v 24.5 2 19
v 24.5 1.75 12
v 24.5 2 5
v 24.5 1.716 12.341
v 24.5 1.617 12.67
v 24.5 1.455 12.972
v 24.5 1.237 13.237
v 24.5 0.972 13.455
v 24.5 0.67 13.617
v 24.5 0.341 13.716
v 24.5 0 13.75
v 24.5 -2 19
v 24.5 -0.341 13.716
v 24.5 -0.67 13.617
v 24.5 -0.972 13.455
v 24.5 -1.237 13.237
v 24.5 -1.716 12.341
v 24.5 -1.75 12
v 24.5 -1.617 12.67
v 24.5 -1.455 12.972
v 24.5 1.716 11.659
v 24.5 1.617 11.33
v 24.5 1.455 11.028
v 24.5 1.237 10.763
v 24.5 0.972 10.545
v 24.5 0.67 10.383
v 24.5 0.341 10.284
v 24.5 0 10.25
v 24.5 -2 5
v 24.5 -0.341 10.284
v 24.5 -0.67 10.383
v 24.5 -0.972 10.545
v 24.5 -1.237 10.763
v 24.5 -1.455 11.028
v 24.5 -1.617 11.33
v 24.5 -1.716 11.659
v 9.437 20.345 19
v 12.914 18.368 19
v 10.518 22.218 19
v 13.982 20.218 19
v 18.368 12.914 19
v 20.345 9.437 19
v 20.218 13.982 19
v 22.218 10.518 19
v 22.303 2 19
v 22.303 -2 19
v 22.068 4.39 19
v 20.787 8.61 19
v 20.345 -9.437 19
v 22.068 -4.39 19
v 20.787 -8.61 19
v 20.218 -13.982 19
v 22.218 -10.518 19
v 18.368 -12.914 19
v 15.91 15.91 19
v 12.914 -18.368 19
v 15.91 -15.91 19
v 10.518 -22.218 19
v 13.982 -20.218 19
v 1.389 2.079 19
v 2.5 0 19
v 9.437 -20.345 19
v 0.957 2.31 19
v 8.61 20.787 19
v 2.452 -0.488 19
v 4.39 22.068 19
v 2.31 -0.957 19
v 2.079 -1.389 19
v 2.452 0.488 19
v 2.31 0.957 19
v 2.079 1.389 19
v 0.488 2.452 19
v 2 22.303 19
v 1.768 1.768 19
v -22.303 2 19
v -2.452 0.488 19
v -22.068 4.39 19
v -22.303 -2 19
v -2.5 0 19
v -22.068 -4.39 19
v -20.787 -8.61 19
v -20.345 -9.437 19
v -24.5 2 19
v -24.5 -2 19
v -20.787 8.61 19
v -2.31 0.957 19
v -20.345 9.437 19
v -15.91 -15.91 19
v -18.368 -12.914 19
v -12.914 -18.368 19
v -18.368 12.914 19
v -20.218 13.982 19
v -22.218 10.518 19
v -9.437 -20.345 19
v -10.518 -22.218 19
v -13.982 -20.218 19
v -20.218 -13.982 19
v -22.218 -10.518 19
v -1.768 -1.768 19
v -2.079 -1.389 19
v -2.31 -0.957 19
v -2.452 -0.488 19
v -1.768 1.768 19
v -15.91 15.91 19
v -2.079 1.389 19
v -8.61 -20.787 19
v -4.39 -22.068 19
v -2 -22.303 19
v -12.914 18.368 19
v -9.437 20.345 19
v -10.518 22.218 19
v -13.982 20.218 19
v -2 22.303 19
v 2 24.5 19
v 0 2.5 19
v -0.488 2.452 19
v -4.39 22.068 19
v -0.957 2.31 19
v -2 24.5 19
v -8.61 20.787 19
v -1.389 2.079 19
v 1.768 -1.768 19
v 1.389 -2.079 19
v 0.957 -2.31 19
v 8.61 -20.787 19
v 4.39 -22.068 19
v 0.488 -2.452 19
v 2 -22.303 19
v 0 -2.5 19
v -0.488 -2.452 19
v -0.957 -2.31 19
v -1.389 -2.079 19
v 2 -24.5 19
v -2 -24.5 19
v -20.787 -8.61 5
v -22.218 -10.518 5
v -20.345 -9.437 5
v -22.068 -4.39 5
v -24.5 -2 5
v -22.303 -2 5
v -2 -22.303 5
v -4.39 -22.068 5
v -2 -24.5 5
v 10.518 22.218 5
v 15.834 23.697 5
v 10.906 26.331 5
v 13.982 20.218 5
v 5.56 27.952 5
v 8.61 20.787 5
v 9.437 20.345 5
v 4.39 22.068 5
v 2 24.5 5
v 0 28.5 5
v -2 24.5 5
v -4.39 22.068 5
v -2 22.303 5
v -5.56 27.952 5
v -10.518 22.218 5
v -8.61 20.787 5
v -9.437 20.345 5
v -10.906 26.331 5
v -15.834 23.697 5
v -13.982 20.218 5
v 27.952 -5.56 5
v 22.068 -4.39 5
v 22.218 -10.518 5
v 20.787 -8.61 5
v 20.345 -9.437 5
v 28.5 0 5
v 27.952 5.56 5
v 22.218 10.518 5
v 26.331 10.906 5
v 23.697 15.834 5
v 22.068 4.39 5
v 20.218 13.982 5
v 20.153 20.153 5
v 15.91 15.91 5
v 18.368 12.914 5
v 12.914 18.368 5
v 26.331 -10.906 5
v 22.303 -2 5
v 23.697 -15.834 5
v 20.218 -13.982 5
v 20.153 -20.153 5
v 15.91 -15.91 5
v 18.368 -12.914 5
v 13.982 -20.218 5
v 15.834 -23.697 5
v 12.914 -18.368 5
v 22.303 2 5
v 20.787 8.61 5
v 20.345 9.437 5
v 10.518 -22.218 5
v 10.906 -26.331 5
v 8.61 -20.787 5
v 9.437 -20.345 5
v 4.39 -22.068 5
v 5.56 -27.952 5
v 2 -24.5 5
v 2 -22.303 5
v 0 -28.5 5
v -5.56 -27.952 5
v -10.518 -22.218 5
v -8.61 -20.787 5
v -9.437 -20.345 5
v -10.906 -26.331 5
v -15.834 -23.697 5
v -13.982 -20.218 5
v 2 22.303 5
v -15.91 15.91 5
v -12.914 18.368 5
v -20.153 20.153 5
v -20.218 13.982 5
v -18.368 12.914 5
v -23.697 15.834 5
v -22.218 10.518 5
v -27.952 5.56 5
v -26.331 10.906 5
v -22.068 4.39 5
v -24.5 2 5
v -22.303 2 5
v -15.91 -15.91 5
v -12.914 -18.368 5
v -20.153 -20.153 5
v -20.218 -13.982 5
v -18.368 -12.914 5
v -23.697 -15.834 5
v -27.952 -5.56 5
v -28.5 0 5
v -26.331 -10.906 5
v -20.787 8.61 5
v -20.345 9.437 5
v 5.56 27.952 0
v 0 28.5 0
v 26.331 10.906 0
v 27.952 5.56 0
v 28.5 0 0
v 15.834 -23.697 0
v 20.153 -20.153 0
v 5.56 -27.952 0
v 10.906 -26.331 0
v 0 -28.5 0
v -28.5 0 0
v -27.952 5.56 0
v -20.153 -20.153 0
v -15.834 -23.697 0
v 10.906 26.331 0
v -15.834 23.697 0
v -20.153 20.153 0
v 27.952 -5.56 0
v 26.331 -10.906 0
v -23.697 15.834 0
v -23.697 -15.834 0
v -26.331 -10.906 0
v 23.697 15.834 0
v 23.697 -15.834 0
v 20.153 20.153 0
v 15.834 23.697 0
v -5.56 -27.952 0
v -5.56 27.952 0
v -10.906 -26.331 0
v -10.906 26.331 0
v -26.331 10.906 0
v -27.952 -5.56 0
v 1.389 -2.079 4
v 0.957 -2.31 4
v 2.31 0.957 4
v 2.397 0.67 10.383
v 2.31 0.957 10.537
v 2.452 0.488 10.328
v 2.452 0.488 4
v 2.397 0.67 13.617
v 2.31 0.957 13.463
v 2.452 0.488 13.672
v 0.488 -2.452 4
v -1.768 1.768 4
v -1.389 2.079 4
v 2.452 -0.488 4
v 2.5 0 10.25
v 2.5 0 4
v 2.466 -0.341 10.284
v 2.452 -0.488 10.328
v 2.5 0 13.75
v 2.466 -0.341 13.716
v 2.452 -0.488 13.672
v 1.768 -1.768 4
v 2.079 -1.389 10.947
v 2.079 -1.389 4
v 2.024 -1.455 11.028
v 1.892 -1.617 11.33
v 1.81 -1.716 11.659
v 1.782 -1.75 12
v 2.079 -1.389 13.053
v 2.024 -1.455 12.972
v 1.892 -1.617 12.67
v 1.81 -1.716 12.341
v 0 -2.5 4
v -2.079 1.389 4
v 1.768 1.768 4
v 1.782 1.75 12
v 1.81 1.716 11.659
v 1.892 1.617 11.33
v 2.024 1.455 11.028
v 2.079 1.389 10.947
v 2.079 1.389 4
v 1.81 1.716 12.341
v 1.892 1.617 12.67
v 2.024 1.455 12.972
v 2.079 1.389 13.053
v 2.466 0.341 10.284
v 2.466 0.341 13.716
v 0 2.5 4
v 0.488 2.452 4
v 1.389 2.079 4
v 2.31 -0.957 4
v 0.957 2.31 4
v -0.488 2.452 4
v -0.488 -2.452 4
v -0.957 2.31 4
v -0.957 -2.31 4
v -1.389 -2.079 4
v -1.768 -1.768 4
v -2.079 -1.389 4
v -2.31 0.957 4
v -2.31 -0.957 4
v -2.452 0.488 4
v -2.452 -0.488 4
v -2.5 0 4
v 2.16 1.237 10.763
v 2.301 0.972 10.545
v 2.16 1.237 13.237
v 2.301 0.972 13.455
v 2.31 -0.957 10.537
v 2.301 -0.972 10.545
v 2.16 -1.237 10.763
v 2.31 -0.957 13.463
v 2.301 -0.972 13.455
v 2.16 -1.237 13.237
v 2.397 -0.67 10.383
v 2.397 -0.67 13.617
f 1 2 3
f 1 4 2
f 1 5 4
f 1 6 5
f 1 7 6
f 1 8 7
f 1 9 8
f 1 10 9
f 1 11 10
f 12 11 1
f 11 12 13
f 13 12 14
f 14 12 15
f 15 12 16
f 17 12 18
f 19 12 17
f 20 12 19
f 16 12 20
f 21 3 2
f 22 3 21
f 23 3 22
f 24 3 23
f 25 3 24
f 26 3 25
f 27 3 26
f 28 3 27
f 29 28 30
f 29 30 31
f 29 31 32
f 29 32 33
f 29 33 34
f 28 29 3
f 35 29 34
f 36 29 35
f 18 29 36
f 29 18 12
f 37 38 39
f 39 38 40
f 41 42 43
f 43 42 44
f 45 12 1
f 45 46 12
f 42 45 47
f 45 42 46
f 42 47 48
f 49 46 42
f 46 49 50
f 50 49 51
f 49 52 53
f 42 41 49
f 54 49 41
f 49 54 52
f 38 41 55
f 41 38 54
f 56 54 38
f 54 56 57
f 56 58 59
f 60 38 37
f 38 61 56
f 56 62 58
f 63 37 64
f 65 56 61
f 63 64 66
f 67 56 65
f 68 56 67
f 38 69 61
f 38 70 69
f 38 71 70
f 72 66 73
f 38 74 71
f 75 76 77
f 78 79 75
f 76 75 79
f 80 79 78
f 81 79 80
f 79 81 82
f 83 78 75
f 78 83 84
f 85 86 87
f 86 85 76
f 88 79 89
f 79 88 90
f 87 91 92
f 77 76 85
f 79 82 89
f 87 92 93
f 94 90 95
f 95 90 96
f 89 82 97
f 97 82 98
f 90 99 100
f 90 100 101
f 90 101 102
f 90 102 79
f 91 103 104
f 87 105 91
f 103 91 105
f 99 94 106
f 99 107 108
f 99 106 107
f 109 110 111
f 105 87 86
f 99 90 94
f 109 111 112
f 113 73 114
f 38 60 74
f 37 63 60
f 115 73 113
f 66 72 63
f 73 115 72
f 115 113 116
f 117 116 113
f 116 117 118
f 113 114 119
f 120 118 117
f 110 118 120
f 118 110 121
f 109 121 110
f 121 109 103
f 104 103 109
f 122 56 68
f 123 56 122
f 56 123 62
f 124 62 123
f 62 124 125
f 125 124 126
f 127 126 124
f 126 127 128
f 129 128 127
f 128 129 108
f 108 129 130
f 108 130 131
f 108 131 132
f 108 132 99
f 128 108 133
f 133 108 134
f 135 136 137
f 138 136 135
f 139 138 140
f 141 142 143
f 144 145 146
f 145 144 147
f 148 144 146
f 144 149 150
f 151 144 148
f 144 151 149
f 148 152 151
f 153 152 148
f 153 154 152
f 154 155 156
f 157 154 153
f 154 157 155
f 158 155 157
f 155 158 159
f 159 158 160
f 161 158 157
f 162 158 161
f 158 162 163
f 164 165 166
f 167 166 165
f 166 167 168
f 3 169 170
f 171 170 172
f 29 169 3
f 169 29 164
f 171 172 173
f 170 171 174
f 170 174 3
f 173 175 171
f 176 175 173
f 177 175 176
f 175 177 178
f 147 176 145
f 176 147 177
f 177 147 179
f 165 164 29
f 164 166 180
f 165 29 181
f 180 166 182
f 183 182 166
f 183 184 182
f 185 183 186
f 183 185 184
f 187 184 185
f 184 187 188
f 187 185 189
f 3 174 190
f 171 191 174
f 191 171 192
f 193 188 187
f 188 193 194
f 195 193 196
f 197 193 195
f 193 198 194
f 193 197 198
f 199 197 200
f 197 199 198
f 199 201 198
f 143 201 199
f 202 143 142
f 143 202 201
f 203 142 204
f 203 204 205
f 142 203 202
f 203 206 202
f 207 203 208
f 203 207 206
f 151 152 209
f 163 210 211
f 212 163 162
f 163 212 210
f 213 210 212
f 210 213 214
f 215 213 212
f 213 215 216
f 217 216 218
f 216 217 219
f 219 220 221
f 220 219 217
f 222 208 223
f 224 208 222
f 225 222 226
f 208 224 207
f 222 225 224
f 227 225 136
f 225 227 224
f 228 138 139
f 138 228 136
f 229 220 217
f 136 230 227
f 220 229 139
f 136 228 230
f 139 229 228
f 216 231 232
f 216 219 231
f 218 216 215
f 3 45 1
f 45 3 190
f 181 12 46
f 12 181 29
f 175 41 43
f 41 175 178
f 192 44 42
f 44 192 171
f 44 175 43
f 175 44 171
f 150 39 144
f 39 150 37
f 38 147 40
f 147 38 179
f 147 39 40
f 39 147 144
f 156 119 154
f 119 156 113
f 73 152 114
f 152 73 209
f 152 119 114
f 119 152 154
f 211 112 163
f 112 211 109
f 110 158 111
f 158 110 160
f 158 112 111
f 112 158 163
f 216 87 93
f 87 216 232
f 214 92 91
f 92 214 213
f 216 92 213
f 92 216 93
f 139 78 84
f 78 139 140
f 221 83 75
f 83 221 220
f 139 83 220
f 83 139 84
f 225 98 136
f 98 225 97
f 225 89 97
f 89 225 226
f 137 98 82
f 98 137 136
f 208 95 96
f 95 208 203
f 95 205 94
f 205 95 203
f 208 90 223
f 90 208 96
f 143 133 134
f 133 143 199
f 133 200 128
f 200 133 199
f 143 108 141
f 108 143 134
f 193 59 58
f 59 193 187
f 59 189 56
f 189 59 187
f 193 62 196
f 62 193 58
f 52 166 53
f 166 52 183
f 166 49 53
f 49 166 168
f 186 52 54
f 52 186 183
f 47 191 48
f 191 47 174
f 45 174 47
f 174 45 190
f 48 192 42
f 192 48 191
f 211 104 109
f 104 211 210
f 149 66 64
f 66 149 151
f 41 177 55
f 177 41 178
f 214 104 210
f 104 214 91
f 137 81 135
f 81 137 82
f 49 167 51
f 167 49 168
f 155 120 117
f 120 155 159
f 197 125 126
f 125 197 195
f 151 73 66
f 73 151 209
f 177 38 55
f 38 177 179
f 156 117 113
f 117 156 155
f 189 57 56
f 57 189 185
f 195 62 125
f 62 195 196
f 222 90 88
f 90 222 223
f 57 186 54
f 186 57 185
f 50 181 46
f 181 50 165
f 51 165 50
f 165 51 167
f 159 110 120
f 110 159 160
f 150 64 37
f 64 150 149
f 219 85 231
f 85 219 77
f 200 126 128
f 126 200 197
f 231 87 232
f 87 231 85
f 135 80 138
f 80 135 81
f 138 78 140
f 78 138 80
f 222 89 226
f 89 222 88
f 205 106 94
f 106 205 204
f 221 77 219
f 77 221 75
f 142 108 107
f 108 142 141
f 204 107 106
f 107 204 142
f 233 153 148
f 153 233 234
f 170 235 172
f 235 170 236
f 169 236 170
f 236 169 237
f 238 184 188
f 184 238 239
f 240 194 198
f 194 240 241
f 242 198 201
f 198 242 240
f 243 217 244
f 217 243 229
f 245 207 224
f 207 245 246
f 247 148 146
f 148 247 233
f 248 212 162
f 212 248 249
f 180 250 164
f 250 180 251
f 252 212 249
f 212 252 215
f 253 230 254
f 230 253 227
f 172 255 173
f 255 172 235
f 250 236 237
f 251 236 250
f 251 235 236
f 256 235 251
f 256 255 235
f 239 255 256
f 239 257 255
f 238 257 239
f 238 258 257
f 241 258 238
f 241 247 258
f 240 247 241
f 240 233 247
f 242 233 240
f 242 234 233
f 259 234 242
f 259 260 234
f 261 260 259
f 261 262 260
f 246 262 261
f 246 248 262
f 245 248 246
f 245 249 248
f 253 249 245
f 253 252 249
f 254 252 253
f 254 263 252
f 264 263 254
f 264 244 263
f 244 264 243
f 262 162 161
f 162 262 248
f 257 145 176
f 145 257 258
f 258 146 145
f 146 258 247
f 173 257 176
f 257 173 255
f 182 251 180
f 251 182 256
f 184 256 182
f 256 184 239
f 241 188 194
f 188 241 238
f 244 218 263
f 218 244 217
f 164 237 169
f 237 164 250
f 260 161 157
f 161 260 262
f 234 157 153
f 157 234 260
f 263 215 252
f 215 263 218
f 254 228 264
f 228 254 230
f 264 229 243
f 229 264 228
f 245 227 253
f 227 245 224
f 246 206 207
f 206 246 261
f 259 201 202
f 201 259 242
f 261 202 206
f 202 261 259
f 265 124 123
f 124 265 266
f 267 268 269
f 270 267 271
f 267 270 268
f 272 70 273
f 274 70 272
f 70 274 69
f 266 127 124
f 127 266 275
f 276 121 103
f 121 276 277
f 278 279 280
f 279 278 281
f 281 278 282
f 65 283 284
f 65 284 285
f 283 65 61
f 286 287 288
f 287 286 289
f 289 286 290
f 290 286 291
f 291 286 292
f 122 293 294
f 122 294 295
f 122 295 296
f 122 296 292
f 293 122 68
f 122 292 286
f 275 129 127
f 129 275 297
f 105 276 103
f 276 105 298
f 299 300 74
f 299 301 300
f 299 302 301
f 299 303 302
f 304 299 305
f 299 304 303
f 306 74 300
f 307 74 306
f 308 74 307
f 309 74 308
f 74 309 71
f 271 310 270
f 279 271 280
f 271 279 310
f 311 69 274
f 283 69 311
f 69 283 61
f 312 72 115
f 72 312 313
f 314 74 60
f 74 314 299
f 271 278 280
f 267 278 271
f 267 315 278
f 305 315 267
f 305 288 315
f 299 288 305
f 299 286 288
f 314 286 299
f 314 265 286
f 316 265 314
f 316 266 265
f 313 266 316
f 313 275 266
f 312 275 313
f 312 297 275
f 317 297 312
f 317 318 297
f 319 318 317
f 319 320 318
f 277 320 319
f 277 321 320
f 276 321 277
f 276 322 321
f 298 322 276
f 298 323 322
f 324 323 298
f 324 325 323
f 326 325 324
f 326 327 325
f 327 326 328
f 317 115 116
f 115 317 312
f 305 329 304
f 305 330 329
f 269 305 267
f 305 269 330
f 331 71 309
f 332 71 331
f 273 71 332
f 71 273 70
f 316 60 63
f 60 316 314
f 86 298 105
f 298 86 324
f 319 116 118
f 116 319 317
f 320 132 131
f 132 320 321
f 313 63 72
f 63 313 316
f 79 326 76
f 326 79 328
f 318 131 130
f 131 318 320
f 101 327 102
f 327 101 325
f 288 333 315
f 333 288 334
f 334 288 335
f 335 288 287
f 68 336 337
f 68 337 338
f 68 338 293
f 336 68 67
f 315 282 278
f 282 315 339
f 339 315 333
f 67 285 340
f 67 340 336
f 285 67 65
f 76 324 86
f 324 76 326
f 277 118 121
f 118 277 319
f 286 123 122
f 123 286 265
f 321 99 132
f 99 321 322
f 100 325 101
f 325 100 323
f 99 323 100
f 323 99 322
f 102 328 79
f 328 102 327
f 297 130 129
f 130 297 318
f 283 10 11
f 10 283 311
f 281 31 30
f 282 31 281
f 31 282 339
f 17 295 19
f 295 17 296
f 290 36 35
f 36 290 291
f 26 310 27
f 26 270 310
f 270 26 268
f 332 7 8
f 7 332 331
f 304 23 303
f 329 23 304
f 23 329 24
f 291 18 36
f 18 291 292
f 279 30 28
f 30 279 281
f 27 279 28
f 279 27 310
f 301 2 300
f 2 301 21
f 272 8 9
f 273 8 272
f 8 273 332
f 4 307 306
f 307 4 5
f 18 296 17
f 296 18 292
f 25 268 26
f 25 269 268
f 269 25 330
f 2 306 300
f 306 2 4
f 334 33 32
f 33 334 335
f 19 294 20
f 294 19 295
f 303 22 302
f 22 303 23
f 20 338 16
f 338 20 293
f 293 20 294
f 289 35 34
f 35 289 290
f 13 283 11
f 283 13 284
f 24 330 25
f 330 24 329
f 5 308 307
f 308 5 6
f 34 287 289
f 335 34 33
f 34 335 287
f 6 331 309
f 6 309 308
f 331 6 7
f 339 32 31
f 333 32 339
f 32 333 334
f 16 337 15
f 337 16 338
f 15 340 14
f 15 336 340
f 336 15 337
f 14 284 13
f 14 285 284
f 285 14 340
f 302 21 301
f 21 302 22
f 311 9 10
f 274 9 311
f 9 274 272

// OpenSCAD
$fn = 32;

// ----------------------------------------------------------------------
// Control knob: skirt knob with grip ribs
// ----------------------------------------------------------------------

// --- parameters (mm) ---
skirt_d = 57;             // skirt diameter
skirt_t = 5;              // skirt thickness
rib_w = 4;                // grip rib width
rib_out = 3;              // grip rib radial protrusion
n_ribs = 12;              // number of grip ribs
knob_d = 45;              // knob body diameter
knob_h = 14;              // knob body height
bore_d = 5;               // shaft bore diameter
set_d = 3.5;              // set screw bore diameter

rib_step = 360 / n_ribs;  // rib angular step
total_h = skirt_t + knob_h;  // overall height

difference() {
  union() {
    translate([0, 0, skirt_t]) cylinder(h = knob_h, d = knob_d);
    cylinder(h = skirt_t, d = skirt_d);
    for (i = [0 : n_ribs - 1])
      rotate([0, 0, i * rib_step])
        translate([knob_d / 2 - 1, -rib_w / 2, skirt_t])
          cube([rib_out, rib_w, knob_h]);
  }
  translate([0, 0, skirt_t - 1]) cylinder(h = knob_h + 2, d = bore_d);
  translate([-1, 0, skirt_t + knob_h / 2]) rotate([0, 90, 0])
    cylinder(h = knob_d / 2 + bore_d / 2 + 2, d = set_d);
}
